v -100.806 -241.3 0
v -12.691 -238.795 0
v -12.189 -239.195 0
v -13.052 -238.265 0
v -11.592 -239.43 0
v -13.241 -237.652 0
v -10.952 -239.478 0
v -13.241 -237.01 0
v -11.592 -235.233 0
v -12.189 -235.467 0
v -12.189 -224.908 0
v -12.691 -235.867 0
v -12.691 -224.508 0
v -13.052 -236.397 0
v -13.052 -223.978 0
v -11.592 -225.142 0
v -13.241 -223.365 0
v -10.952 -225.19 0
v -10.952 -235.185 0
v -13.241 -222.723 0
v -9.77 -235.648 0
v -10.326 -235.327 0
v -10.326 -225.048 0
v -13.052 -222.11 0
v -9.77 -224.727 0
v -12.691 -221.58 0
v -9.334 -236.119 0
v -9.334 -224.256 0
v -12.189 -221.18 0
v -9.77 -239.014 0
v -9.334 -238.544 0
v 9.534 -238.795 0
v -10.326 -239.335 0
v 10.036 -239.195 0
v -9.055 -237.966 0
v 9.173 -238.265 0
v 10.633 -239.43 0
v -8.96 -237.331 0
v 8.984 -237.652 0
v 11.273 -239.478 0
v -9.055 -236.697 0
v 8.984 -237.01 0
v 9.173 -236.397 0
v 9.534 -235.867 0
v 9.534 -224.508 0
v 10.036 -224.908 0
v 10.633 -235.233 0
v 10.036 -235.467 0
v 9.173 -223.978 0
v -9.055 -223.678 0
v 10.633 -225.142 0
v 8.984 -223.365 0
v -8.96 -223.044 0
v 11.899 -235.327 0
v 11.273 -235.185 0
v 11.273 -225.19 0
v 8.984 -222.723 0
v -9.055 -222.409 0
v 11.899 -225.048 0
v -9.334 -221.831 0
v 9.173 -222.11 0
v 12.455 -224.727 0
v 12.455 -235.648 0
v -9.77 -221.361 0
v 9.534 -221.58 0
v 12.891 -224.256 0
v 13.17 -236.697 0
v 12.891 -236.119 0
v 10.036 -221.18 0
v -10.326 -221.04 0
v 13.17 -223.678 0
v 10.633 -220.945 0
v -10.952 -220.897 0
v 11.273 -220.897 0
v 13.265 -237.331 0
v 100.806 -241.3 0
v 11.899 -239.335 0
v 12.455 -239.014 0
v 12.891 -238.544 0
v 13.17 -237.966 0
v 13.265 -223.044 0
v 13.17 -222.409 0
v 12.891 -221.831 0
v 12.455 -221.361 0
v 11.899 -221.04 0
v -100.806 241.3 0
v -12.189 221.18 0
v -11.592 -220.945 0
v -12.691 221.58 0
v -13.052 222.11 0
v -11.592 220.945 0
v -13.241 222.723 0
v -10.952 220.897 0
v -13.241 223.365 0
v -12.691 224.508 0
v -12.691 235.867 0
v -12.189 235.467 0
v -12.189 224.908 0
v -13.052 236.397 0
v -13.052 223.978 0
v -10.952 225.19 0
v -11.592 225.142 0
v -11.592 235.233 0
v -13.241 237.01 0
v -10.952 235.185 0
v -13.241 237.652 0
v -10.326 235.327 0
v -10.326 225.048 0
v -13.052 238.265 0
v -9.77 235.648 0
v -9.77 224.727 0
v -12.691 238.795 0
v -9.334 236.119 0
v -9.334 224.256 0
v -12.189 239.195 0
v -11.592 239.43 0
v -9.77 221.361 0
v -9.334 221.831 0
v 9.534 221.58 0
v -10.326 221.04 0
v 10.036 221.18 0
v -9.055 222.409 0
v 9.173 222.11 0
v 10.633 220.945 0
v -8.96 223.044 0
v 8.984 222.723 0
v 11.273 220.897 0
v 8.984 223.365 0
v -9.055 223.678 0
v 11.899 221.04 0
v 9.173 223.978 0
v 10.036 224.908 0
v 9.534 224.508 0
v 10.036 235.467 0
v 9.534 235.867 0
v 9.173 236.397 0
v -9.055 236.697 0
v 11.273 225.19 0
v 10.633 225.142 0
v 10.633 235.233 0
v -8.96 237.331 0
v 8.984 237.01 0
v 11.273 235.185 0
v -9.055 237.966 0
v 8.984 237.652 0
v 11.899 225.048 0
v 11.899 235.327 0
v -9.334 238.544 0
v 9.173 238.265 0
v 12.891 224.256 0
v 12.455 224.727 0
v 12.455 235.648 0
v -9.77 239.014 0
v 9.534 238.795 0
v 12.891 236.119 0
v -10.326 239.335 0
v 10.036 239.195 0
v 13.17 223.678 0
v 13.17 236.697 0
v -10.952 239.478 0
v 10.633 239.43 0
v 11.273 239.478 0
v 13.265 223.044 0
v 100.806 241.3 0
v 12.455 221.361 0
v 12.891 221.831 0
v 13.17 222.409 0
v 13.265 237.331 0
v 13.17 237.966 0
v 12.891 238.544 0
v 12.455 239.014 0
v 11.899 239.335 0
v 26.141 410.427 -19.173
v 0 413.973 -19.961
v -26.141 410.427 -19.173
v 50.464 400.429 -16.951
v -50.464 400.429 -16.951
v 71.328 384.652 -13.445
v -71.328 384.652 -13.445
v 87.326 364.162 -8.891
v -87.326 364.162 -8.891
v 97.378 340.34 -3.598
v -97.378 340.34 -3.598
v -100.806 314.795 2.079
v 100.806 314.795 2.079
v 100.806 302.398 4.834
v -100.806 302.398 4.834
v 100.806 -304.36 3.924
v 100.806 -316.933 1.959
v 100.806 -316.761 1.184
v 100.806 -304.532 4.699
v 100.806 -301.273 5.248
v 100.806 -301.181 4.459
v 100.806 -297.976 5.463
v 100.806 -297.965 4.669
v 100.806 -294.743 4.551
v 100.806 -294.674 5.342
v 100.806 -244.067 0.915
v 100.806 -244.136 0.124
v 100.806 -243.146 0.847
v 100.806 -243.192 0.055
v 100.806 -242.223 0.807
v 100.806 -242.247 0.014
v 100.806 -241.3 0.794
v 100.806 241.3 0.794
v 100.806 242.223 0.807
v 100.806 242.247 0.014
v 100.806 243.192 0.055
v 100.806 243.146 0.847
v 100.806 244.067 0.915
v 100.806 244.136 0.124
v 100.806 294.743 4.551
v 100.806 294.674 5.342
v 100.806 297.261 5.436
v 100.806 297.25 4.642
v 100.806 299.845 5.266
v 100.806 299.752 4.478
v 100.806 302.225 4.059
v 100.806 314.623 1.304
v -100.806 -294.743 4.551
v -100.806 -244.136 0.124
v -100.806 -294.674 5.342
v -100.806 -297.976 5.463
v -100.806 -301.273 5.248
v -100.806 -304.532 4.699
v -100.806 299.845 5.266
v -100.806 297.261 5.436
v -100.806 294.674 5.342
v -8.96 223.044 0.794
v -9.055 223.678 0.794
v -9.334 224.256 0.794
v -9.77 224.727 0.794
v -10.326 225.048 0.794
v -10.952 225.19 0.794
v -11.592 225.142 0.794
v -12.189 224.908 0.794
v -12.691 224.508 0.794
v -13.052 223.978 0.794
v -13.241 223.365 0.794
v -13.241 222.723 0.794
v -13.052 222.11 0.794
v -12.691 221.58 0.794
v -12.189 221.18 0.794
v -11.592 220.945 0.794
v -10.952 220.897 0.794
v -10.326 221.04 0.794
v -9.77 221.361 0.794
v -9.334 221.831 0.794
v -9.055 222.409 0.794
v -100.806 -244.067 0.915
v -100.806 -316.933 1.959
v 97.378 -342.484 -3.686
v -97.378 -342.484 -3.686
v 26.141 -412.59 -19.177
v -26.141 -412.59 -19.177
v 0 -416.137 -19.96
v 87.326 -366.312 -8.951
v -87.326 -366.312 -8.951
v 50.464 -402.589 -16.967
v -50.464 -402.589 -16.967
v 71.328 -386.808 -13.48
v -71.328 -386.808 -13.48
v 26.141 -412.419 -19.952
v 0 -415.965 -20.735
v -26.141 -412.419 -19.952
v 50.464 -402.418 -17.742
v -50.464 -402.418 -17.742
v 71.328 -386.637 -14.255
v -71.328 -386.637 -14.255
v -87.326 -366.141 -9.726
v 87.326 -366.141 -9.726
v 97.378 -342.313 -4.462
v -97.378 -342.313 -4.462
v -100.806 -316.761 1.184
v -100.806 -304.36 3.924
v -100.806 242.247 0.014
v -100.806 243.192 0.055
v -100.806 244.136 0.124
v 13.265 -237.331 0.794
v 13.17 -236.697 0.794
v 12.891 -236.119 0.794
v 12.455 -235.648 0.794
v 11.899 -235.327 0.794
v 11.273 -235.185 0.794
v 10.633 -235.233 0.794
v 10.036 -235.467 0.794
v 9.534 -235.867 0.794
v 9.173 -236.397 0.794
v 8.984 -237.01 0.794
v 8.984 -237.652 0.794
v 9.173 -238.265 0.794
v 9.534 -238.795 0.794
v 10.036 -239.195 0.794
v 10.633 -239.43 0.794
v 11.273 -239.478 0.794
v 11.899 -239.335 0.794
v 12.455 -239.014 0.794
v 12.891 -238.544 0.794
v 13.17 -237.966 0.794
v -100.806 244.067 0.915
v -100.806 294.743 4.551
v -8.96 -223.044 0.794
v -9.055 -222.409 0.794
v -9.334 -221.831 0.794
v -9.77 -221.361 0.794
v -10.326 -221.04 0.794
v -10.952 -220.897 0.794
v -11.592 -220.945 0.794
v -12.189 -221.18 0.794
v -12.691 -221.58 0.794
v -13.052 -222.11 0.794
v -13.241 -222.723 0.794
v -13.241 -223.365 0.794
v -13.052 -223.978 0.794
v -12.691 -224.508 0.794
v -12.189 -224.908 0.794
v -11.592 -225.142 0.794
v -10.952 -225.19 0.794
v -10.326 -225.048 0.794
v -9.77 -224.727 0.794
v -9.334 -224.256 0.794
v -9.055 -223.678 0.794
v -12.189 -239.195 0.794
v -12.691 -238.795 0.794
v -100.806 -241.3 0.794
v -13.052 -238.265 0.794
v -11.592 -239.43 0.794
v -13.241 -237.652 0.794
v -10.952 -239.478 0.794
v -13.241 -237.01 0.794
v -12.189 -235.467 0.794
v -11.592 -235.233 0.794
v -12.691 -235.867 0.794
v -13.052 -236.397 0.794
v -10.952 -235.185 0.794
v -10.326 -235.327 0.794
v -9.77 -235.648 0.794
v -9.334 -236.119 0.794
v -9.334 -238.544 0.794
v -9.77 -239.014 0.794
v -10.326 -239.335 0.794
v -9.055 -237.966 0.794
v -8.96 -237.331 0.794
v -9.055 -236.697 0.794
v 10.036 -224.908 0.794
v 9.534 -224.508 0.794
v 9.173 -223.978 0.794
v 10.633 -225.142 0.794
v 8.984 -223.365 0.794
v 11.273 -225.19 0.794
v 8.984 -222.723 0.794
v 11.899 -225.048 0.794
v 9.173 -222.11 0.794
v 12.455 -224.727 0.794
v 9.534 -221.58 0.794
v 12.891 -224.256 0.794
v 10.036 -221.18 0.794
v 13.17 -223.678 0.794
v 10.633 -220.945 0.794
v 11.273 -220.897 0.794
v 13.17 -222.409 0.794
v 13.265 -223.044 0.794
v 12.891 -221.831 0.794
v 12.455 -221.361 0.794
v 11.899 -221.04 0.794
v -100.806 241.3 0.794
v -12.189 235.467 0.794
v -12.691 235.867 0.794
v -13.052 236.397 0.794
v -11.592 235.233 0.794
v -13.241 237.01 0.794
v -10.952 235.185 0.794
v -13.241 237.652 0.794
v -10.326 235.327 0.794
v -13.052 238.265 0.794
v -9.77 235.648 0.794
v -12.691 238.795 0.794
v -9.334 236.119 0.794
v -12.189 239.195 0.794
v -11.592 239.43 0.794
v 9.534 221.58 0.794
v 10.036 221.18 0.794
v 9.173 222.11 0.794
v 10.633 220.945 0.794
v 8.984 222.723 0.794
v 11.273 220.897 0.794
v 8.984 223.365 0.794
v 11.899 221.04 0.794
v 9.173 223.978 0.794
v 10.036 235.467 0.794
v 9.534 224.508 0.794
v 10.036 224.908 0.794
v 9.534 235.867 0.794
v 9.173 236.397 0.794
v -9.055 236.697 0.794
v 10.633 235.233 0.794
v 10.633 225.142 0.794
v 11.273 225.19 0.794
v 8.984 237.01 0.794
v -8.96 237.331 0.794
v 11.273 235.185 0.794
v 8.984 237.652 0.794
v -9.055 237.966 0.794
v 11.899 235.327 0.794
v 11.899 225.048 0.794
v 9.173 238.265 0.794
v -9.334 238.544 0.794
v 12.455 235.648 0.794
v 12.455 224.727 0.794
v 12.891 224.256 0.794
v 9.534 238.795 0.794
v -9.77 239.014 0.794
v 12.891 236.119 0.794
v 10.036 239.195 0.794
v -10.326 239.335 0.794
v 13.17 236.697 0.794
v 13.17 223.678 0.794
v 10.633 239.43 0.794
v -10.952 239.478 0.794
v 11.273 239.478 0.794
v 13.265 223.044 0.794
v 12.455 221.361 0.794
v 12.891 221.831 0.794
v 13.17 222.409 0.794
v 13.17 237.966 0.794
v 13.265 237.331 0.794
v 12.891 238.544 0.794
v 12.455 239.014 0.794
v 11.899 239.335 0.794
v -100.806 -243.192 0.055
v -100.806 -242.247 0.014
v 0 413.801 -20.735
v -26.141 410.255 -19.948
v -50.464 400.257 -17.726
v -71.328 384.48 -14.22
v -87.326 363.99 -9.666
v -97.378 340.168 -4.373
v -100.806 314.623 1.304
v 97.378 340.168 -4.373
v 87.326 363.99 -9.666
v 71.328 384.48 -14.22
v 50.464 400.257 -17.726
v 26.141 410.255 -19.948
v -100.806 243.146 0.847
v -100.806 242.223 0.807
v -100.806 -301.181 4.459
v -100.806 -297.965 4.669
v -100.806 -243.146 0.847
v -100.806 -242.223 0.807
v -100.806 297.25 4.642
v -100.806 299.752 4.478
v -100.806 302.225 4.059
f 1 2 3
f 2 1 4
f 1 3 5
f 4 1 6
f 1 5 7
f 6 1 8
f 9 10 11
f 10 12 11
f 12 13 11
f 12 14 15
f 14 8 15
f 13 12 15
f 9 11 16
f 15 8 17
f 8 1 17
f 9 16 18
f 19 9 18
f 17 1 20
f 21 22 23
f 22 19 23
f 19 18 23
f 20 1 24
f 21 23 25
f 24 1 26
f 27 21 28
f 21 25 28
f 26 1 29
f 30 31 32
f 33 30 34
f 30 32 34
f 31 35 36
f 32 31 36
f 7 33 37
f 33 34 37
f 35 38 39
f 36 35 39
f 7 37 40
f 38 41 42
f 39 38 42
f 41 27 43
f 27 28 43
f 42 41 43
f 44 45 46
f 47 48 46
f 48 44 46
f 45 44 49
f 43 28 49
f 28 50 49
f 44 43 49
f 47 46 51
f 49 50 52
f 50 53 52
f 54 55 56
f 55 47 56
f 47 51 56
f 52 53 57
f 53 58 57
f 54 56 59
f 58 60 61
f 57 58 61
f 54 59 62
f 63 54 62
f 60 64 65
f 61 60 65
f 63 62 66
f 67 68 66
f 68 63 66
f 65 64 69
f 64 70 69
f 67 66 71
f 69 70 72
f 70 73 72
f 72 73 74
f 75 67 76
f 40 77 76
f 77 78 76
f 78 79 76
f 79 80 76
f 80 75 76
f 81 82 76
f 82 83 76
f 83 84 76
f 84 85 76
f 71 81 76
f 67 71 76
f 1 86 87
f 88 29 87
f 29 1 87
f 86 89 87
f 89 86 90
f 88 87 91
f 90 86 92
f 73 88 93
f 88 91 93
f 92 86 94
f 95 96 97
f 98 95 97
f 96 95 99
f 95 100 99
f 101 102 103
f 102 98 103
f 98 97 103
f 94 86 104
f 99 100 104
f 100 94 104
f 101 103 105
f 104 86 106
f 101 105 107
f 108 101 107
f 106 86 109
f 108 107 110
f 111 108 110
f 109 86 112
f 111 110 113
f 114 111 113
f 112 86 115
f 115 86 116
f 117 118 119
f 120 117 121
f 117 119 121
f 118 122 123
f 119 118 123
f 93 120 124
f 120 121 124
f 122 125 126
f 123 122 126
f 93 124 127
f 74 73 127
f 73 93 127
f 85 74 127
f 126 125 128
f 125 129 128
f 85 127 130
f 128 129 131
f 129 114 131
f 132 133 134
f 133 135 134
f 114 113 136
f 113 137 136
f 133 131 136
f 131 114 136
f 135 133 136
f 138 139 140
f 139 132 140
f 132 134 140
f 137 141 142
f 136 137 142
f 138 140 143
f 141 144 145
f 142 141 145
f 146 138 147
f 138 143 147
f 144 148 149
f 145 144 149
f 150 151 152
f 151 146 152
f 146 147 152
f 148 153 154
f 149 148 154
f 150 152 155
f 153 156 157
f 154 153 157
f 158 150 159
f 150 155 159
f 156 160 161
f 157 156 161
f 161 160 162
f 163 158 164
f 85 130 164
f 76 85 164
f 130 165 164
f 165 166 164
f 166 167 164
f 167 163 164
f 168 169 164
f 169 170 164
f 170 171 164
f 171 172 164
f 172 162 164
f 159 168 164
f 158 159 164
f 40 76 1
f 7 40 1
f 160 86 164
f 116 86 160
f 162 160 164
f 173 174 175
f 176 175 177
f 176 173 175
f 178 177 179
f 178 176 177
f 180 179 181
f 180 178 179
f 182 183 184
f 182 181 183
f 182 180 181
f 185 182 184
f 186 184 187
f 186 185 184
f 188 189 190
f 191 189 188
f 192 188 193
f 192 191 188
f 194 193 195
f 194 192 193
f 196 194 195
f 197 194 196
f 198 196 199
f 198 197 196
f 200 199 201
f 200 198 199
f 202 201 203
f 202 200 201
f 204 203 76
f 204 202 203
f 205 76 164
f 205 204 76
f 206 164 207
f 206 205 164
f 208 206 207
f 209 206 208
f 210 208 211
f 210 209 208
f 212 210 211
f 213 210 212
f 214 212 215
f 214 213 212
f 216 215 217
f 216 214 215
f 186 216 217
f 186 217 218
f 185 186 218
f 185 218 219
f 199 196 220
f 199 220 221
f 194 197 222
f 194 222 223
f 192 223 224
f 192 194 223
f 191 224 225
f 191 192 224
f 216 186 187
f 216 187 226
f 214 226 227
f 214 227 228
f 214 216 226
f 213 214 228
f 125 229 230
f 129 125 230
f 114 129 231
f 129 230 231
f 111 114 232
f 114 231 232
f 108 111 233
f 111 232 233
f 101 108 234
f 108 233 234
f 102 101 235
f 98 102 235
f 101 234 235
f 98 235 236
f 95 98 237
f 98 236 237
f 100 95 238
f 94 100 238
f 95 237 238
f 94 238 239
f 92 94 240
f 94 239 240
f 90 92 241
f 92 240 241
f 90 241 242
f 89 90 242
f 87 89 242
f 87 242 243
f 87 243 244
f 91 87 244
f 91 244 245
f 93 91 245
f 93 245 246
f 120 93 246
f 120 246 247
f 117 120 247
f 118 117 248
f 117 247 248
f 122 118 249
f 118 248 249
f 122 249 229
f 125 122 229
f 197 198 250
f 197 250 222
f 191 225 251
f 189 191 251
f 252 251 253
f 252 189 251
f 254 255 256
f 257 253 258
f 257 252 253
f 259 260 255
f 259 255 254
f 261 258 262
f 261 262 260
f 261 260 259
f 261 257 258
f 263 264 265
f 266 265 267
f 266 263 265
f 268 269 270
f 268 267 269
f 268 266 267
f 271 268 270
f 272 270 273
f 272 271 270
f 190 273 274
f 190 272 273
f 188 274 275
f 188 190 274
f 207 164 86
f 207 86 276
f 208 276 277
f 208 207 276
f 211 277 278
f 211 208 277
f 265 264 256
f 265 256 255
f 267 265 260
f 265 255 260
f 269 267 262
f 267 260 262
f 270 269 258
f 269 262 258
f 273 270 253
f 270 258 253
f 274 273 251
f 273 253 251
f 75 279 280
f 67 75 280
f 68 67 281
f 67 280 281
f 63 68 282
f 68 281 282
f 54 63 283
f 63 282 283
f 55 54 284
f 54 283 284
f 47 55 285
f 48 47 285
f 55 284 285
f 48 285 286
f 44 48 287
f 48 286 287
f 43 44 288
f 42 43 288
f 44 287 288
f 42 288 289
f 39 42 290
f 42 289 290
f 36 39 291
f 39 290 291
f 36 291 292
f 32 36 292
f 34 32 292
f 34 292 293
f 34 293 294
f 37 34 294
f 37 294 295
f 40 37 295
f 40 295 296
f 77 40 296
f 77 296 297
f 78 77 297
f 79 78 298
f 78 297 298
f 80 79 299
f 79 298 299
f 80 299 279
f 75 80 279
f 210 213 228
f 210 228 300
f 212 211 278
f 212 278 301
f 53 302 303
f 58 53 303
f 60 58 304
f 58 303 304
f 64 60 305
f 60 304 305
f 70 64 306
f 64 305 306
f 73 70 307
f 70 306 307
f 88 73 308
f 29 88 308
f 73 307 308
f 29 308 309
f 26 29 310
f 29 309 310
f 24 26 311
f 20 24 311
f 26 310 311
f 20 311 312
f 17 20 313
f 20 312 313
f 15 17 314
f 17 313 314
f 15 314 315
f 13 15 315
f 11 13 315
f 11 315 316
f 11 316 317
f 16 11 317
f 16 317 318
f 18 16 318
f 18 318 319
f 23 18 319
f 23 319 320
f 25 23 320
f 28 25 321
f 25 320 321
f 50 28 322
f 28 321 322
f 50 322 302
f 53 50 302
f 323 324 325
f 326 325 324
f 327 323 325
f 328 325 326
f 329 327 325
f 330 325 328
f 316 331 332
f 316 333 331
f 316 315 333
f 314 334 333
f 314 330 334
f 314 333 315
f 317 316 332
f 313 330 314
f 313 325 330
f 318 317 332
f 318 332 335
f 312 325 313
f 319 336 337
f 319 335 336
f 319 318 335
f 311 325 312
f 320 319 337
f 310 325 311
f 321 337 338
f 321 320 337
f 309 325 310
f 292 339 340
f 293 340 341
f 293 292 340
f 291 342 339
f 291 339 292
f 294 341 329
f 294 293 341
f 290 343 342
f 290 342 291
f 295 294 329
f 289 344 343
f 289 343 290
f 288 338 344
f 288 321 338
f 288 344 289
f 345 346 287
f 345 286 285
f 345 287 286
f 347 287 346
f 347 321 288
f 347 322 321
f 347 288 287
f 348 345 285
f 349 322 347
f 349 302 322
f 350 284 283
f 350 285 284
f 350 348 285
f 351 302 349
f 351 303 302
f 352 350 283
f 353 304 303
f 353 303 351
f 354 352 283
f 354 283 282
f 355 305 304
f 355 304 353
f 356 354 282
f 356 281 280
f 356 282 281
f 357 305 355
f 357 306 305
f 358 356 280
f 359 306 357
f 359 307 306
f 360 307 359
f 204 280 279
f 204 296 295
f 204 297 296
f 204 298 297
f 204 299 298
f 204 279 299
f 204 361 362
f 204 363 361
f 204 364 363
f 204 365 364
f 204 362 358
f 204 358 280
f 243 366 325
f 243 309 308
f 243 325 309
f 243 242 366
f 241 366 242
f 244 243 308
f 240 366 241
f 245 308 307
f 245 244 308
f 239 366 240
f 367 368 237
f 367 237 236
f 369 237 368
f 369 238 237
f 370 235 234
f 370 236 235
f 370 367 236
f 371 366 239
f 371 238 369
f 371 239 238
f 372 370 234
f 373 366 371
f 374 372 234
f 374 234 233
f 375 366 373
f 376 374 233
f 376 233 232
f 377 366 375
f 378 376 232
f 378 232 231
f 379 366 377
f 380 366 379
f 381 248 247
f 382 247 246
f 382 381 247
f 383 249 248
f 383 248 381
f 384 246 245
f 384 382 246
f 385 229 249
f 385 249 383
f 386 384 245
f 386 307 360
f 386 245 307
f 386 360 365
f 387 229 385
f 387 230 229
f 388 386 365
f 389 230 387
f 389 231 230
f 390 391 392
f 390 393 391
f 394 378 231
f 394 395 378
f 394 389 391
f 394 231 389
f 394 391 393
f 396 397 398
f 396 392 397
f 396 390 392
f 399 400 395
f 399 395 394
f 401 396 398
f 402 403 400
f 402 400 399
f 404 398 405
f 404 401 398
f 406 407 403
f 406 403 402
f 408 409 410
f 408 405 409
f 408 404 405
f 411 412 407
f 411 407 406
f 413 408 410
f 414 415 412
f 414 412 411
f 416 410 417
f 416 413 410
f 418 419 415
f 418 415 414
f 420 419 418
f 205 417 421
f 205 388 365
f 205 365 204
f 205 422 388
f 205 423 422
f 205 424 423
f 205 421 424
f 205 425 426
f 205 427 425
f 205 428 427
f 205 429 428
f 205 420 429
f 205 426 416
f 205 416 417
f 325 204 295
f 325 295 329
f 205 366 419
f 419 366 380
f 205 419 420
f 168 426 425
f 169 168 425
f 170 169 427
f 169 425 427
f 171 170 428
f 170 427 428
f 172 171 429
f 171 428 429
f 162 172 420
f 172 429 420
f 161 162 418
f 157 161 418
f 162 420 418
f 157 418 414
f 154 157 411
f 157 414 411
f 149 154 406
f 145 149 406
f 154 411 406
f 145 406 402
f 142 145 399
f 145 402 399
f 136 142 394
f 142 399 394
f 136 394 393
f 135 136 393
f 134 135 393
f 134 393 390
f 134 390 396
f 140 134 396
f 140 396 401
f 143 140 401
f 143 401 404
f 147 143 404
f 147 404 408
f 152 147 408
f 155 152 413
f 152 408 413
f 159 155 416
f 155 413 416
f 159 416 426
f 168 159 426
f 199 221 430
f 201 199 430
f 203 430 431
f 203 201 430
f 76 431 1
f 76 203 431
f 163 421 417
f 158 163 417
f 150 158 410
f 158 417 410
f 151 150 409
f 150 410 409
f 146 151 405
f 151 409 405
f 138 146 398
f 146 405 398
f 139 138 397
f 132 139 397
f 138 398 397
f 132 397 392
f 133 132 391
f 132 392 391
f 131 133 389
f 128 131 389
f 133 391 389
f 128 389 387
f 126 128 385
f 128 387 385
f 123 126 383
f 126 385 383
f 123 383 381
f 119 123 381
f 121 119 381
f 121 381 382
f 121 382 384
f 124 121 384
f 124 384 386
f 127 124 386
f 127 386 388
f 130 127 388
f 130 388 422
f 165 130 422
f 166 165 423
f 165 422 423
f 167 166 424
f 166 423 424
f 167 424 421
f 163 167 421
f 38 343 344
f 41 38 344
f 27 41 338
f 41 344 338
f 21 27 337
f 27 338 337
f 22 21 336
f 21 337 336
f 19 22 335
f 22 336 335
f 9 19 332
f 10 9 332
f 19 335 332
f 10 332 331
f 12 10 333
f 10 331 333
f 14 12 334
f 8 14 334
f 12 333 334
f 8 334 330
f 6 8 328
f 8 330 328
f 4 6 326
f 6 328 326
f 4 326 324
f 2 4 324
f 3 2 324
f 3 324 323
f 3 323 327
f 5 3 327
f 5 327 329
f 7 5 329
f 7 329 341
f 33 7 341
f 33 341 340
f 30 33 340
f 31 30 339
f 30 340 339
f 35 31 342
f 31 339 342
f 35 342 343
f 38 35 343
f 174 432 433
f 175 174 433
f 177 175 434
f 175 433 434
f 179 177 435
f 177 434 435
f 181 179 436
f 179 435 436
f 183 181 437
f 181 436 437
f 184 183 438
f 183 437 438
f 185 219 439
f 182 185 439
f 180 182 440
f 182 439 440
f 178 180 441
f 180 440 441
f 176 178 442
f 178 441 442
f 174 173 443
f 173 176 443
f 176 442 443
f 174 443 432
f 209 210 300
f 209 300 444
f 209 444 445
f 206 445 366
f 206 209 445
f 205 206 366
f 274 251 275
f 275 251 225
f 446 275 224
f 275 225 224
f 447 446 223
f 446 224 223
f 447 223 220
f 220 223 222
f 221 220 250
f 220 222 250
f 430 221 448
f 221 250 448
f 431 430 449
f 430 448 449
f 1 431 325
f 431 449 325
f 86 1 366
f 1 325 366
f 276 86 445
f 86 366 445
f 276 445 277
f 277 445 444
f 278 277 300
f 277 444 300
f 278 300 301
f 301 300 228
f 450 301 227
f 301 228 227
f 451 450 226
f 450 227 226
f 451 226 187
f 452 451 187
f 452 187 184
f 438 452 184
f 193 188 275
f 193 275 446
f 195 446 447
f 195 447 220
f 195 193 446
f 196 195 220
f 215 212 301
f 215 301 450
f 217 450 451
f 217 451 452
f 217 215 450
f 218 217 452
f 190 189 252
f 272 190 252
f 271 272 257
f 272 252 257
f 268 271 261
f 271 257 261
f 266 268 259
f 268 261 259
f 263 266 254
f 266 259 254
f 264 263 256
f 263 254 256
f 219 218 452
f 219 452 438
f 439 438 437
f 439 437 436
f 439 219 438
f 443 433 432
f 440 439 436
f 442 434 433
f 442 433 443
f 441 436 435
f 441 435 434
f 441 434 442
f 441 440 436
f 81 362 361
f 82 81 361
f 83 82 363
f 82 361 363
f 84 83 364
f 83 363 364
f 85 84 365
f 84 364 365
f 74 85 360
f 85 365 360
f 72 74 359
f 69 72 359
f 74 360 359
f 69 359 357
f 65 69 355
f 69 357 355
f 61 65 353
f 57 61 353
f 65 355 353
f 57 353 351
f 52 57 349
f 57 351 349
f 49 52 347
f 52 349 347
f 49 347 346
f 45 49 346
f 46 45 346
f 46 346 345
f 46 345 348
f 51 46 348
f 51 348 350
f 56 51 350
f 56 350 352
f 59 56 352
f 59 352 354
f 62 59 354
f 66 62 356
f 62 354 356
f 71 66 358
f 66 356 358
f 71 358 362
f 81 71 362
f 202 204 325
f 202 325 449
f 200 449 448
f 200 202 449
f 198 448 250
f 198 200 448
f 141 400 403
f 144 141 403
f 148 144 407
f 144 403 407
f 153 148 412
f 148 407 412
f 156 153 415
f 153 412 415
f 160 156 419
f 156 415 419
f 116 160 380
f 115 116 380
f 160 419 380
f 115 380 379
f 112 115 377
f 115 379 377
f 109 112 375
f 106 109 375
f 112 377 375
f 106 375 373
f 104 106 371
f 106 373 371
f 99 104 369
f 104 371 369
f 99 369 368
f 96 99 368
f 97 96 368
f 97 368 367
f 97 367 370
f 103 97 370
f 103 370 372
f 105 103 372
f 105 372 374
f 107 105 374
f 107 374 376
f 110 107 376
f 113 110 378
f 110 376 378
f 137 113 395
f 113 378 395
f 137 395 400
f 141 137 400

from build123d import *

# Parameters (mm, degrees)
F0_W        = 201.6125
F0_H        = 482.6
F1_DEPTH    = 0.79375
F3_DEPTH    = 201.6125
F4_T1_DEPTH = 508.79375
F4_T3_DEPTH = 508.79375
F5_R        = 2.15265
F6_DEPTH    = 0.79375


# Not quite as in the source:
# - a fillet or chamfer that OpenCascade refuses, or shapes differently, is made with other operations: its cross-section is extruded or revolved along the edge and cut away or added


with BuildPart() as f1:
    # F0 (on Top) → F1 (new body)
    with BuildSketch(Plane.XY):
        Rectangle(F0_W, F0_H)
    extrude(amount=F1_DEPTH)

    # F2 (on face) → F3 (join, through all)
    with BuildSketch(Plane.YZ.offset(100.80625)):
        with BuildLine():
            ThreePointArc((244.0671948322, 0.9145683356), (242.6849155488, 0.8239689648), (241.3, 0.79375))
            Line((241.3, 0.79375), (241.3, 0))
            ThreePointArc((241.3, 0), (242.7195384376, 0.0309744389), (244.136374703, 0.123838794))
            Line((244.136374703, 0.123838794), (294.7430653661, 4.5513505256))
            ThreePointArc((294.7430653661, 4.5513505256), (298.5031396949, 4.5918955138), (302.2254864388, 4.0590375853))
            Line((302.2254864388, 4.0590375853), (413.8036674178, -20.7361137434))
            Line((413.8036674178, -20.7361137434), (413.9758559687, -19.9612652644))
            Line((413.9758559687, -19.9612652644), (302.3976749897, 4.8338860643))
            ThreePointArc((302.3976749897, 4.8338860643), (298.5552525443, 5.3839329582), (294.6738854953, 5.3420800672))
            Line((294.6738854953, 5.3420800672), (244.0671948322, 0.9145683356))
        make_face()
        with BuildLine():
            Line((-241.3, 0), (-241.3, 0.79375))
            ThreePointArc((-241.3, 0.79375), (-242.6849155488, 0.8239689648), (-244.0671948322, 0.9145683356))
            Line((-244.0671948322, 0.9145683356), (-294.6738854953, 5.3420800672))
            ThreePointArc((-294.6738854953, 5.3420800672), (-299.6272962644, 5.3969871417), (-304.5316552149, 4.699451251))
            Line((-304.5316552149, 4.699451251), (-416.1396714134, -19.9610580753))
            Line((-416.1396714134, -19.9610580753), (-415.9684178764, -20.7361137434))
            Line((-415.9684178764, -20.7361137434), (-304.3604016779, 3.924395583))
            ThreePointArc((-304.3604016779, 3.924395583), (-299.5756612384, 4.6049184032), (-294.7430653661, 4.5513505256))
            Line((-294.7430653661, 4.5513505256), (-244.136374703, 0.123838794))
            ThreePointArc((-244.136374703, 0.123838794), (-242.7195384376, 0.0309744389), (-241.3, 0))
        make_face()
    extrude(amount=-F3_DEPTH)

    # F4: fillet of radius 101.6 on 4 edges, made by hand

    # F4_s2 → F4_t1 (cut)
    with BuildSketch(Plane(origin=(0, -40.0183995531, -180.082797989), x_dir=(1, 0, 0), z_dir=(0, 0.2169304578, 0.9761870602))):
        with BuildLine():
            ThreePointArc((100.80625, 306.8480802377), (71.0482989686, 378.6901292062), (-0.79375, 408.4480802377))
            Line((-0.79375, 408.4480802377), (100.80625, 408.4480802377))
            Line((100.80625, 408.4480802377), (100.80625, 306.8480802377))
        make_face()
        with BuildLine():
            ThreePointArc((0.79375, 408.4480802377), (-71.0482989686, 378.6901292062), (-100.80625, 306.8480802377))
            Line((-100.80625, 306.8480802377), (-100.80625, 408.4480802377))
            Line((-100.80625, 408.4480802377), (0.79375, 408.4480802377))
        make_face()
    extrude(amount=F4_T1_DEPTH, mode=Mode.SUBTRACT)

    # F4_s4 → F4_t3 (cut)
    with BuildSketch(Plane(origin=(0, -69.9668558158, 316.6545294712), x_dir=(1, 0, 0), z_dir=(0, 0.2157524875, -0.9764480857))):
        with BuildLine():
            ThreePointArc((100.80625, 309.0454334801), (71.0482989686, 380.8874824486), (-0.79375, 410.6454334801))
            Line((-0.79375, 410.6454334801), (100.80625, 410.6454334801))
            Line((100.80625, 410.6454334801), (100.80625, 309.0454334801))
        make_face()
        with BuildLine():
            ThreePointArc((0.79375, 410.6454334801), (-71.0482989686, 380.8874824486), (-100.80625, 309.0454334801))
            Line((-100.80625, 309.0454334801), (-100.80625, 410.6454334801))
            Line((-100.80625, 410.6454334801), (0.79375, 410.6454334801))
        make_face()
    extrude(amount=F4_T3_DEPTH, mode=Mode.SUBTRACT)

    # F5 (on face) → F6 (cut, through all)
    with BuildSketch(Plane.XY.offset(0.79375)):
        with Locations((-11.1125, 237.33125)):
            Circle(F5_R)
        with Locations((11.1125, 237.33125)):
            Circle(F5_R)
        with Locations((11.1125, 223.04375)):
            Circle(F5_R)
        with Locations((-11.1125, 223.04375)):
            Circle(F5_R)
        with Locations((11.1125, -223.04375)):
            Circle(F5_R)
        with Locations((-11.1125, -223.04375)):
            Circle(F5_R)
        with Locations((-11.1125, -237.33125)):
            Circle(F5_R)
        with Locations((11.1125, -237.33125)):
            Circle(F5_R)
    extrude(amount=-F6_DEPTH, mode=Mode.SUBTRACT)


solid = f1.part
